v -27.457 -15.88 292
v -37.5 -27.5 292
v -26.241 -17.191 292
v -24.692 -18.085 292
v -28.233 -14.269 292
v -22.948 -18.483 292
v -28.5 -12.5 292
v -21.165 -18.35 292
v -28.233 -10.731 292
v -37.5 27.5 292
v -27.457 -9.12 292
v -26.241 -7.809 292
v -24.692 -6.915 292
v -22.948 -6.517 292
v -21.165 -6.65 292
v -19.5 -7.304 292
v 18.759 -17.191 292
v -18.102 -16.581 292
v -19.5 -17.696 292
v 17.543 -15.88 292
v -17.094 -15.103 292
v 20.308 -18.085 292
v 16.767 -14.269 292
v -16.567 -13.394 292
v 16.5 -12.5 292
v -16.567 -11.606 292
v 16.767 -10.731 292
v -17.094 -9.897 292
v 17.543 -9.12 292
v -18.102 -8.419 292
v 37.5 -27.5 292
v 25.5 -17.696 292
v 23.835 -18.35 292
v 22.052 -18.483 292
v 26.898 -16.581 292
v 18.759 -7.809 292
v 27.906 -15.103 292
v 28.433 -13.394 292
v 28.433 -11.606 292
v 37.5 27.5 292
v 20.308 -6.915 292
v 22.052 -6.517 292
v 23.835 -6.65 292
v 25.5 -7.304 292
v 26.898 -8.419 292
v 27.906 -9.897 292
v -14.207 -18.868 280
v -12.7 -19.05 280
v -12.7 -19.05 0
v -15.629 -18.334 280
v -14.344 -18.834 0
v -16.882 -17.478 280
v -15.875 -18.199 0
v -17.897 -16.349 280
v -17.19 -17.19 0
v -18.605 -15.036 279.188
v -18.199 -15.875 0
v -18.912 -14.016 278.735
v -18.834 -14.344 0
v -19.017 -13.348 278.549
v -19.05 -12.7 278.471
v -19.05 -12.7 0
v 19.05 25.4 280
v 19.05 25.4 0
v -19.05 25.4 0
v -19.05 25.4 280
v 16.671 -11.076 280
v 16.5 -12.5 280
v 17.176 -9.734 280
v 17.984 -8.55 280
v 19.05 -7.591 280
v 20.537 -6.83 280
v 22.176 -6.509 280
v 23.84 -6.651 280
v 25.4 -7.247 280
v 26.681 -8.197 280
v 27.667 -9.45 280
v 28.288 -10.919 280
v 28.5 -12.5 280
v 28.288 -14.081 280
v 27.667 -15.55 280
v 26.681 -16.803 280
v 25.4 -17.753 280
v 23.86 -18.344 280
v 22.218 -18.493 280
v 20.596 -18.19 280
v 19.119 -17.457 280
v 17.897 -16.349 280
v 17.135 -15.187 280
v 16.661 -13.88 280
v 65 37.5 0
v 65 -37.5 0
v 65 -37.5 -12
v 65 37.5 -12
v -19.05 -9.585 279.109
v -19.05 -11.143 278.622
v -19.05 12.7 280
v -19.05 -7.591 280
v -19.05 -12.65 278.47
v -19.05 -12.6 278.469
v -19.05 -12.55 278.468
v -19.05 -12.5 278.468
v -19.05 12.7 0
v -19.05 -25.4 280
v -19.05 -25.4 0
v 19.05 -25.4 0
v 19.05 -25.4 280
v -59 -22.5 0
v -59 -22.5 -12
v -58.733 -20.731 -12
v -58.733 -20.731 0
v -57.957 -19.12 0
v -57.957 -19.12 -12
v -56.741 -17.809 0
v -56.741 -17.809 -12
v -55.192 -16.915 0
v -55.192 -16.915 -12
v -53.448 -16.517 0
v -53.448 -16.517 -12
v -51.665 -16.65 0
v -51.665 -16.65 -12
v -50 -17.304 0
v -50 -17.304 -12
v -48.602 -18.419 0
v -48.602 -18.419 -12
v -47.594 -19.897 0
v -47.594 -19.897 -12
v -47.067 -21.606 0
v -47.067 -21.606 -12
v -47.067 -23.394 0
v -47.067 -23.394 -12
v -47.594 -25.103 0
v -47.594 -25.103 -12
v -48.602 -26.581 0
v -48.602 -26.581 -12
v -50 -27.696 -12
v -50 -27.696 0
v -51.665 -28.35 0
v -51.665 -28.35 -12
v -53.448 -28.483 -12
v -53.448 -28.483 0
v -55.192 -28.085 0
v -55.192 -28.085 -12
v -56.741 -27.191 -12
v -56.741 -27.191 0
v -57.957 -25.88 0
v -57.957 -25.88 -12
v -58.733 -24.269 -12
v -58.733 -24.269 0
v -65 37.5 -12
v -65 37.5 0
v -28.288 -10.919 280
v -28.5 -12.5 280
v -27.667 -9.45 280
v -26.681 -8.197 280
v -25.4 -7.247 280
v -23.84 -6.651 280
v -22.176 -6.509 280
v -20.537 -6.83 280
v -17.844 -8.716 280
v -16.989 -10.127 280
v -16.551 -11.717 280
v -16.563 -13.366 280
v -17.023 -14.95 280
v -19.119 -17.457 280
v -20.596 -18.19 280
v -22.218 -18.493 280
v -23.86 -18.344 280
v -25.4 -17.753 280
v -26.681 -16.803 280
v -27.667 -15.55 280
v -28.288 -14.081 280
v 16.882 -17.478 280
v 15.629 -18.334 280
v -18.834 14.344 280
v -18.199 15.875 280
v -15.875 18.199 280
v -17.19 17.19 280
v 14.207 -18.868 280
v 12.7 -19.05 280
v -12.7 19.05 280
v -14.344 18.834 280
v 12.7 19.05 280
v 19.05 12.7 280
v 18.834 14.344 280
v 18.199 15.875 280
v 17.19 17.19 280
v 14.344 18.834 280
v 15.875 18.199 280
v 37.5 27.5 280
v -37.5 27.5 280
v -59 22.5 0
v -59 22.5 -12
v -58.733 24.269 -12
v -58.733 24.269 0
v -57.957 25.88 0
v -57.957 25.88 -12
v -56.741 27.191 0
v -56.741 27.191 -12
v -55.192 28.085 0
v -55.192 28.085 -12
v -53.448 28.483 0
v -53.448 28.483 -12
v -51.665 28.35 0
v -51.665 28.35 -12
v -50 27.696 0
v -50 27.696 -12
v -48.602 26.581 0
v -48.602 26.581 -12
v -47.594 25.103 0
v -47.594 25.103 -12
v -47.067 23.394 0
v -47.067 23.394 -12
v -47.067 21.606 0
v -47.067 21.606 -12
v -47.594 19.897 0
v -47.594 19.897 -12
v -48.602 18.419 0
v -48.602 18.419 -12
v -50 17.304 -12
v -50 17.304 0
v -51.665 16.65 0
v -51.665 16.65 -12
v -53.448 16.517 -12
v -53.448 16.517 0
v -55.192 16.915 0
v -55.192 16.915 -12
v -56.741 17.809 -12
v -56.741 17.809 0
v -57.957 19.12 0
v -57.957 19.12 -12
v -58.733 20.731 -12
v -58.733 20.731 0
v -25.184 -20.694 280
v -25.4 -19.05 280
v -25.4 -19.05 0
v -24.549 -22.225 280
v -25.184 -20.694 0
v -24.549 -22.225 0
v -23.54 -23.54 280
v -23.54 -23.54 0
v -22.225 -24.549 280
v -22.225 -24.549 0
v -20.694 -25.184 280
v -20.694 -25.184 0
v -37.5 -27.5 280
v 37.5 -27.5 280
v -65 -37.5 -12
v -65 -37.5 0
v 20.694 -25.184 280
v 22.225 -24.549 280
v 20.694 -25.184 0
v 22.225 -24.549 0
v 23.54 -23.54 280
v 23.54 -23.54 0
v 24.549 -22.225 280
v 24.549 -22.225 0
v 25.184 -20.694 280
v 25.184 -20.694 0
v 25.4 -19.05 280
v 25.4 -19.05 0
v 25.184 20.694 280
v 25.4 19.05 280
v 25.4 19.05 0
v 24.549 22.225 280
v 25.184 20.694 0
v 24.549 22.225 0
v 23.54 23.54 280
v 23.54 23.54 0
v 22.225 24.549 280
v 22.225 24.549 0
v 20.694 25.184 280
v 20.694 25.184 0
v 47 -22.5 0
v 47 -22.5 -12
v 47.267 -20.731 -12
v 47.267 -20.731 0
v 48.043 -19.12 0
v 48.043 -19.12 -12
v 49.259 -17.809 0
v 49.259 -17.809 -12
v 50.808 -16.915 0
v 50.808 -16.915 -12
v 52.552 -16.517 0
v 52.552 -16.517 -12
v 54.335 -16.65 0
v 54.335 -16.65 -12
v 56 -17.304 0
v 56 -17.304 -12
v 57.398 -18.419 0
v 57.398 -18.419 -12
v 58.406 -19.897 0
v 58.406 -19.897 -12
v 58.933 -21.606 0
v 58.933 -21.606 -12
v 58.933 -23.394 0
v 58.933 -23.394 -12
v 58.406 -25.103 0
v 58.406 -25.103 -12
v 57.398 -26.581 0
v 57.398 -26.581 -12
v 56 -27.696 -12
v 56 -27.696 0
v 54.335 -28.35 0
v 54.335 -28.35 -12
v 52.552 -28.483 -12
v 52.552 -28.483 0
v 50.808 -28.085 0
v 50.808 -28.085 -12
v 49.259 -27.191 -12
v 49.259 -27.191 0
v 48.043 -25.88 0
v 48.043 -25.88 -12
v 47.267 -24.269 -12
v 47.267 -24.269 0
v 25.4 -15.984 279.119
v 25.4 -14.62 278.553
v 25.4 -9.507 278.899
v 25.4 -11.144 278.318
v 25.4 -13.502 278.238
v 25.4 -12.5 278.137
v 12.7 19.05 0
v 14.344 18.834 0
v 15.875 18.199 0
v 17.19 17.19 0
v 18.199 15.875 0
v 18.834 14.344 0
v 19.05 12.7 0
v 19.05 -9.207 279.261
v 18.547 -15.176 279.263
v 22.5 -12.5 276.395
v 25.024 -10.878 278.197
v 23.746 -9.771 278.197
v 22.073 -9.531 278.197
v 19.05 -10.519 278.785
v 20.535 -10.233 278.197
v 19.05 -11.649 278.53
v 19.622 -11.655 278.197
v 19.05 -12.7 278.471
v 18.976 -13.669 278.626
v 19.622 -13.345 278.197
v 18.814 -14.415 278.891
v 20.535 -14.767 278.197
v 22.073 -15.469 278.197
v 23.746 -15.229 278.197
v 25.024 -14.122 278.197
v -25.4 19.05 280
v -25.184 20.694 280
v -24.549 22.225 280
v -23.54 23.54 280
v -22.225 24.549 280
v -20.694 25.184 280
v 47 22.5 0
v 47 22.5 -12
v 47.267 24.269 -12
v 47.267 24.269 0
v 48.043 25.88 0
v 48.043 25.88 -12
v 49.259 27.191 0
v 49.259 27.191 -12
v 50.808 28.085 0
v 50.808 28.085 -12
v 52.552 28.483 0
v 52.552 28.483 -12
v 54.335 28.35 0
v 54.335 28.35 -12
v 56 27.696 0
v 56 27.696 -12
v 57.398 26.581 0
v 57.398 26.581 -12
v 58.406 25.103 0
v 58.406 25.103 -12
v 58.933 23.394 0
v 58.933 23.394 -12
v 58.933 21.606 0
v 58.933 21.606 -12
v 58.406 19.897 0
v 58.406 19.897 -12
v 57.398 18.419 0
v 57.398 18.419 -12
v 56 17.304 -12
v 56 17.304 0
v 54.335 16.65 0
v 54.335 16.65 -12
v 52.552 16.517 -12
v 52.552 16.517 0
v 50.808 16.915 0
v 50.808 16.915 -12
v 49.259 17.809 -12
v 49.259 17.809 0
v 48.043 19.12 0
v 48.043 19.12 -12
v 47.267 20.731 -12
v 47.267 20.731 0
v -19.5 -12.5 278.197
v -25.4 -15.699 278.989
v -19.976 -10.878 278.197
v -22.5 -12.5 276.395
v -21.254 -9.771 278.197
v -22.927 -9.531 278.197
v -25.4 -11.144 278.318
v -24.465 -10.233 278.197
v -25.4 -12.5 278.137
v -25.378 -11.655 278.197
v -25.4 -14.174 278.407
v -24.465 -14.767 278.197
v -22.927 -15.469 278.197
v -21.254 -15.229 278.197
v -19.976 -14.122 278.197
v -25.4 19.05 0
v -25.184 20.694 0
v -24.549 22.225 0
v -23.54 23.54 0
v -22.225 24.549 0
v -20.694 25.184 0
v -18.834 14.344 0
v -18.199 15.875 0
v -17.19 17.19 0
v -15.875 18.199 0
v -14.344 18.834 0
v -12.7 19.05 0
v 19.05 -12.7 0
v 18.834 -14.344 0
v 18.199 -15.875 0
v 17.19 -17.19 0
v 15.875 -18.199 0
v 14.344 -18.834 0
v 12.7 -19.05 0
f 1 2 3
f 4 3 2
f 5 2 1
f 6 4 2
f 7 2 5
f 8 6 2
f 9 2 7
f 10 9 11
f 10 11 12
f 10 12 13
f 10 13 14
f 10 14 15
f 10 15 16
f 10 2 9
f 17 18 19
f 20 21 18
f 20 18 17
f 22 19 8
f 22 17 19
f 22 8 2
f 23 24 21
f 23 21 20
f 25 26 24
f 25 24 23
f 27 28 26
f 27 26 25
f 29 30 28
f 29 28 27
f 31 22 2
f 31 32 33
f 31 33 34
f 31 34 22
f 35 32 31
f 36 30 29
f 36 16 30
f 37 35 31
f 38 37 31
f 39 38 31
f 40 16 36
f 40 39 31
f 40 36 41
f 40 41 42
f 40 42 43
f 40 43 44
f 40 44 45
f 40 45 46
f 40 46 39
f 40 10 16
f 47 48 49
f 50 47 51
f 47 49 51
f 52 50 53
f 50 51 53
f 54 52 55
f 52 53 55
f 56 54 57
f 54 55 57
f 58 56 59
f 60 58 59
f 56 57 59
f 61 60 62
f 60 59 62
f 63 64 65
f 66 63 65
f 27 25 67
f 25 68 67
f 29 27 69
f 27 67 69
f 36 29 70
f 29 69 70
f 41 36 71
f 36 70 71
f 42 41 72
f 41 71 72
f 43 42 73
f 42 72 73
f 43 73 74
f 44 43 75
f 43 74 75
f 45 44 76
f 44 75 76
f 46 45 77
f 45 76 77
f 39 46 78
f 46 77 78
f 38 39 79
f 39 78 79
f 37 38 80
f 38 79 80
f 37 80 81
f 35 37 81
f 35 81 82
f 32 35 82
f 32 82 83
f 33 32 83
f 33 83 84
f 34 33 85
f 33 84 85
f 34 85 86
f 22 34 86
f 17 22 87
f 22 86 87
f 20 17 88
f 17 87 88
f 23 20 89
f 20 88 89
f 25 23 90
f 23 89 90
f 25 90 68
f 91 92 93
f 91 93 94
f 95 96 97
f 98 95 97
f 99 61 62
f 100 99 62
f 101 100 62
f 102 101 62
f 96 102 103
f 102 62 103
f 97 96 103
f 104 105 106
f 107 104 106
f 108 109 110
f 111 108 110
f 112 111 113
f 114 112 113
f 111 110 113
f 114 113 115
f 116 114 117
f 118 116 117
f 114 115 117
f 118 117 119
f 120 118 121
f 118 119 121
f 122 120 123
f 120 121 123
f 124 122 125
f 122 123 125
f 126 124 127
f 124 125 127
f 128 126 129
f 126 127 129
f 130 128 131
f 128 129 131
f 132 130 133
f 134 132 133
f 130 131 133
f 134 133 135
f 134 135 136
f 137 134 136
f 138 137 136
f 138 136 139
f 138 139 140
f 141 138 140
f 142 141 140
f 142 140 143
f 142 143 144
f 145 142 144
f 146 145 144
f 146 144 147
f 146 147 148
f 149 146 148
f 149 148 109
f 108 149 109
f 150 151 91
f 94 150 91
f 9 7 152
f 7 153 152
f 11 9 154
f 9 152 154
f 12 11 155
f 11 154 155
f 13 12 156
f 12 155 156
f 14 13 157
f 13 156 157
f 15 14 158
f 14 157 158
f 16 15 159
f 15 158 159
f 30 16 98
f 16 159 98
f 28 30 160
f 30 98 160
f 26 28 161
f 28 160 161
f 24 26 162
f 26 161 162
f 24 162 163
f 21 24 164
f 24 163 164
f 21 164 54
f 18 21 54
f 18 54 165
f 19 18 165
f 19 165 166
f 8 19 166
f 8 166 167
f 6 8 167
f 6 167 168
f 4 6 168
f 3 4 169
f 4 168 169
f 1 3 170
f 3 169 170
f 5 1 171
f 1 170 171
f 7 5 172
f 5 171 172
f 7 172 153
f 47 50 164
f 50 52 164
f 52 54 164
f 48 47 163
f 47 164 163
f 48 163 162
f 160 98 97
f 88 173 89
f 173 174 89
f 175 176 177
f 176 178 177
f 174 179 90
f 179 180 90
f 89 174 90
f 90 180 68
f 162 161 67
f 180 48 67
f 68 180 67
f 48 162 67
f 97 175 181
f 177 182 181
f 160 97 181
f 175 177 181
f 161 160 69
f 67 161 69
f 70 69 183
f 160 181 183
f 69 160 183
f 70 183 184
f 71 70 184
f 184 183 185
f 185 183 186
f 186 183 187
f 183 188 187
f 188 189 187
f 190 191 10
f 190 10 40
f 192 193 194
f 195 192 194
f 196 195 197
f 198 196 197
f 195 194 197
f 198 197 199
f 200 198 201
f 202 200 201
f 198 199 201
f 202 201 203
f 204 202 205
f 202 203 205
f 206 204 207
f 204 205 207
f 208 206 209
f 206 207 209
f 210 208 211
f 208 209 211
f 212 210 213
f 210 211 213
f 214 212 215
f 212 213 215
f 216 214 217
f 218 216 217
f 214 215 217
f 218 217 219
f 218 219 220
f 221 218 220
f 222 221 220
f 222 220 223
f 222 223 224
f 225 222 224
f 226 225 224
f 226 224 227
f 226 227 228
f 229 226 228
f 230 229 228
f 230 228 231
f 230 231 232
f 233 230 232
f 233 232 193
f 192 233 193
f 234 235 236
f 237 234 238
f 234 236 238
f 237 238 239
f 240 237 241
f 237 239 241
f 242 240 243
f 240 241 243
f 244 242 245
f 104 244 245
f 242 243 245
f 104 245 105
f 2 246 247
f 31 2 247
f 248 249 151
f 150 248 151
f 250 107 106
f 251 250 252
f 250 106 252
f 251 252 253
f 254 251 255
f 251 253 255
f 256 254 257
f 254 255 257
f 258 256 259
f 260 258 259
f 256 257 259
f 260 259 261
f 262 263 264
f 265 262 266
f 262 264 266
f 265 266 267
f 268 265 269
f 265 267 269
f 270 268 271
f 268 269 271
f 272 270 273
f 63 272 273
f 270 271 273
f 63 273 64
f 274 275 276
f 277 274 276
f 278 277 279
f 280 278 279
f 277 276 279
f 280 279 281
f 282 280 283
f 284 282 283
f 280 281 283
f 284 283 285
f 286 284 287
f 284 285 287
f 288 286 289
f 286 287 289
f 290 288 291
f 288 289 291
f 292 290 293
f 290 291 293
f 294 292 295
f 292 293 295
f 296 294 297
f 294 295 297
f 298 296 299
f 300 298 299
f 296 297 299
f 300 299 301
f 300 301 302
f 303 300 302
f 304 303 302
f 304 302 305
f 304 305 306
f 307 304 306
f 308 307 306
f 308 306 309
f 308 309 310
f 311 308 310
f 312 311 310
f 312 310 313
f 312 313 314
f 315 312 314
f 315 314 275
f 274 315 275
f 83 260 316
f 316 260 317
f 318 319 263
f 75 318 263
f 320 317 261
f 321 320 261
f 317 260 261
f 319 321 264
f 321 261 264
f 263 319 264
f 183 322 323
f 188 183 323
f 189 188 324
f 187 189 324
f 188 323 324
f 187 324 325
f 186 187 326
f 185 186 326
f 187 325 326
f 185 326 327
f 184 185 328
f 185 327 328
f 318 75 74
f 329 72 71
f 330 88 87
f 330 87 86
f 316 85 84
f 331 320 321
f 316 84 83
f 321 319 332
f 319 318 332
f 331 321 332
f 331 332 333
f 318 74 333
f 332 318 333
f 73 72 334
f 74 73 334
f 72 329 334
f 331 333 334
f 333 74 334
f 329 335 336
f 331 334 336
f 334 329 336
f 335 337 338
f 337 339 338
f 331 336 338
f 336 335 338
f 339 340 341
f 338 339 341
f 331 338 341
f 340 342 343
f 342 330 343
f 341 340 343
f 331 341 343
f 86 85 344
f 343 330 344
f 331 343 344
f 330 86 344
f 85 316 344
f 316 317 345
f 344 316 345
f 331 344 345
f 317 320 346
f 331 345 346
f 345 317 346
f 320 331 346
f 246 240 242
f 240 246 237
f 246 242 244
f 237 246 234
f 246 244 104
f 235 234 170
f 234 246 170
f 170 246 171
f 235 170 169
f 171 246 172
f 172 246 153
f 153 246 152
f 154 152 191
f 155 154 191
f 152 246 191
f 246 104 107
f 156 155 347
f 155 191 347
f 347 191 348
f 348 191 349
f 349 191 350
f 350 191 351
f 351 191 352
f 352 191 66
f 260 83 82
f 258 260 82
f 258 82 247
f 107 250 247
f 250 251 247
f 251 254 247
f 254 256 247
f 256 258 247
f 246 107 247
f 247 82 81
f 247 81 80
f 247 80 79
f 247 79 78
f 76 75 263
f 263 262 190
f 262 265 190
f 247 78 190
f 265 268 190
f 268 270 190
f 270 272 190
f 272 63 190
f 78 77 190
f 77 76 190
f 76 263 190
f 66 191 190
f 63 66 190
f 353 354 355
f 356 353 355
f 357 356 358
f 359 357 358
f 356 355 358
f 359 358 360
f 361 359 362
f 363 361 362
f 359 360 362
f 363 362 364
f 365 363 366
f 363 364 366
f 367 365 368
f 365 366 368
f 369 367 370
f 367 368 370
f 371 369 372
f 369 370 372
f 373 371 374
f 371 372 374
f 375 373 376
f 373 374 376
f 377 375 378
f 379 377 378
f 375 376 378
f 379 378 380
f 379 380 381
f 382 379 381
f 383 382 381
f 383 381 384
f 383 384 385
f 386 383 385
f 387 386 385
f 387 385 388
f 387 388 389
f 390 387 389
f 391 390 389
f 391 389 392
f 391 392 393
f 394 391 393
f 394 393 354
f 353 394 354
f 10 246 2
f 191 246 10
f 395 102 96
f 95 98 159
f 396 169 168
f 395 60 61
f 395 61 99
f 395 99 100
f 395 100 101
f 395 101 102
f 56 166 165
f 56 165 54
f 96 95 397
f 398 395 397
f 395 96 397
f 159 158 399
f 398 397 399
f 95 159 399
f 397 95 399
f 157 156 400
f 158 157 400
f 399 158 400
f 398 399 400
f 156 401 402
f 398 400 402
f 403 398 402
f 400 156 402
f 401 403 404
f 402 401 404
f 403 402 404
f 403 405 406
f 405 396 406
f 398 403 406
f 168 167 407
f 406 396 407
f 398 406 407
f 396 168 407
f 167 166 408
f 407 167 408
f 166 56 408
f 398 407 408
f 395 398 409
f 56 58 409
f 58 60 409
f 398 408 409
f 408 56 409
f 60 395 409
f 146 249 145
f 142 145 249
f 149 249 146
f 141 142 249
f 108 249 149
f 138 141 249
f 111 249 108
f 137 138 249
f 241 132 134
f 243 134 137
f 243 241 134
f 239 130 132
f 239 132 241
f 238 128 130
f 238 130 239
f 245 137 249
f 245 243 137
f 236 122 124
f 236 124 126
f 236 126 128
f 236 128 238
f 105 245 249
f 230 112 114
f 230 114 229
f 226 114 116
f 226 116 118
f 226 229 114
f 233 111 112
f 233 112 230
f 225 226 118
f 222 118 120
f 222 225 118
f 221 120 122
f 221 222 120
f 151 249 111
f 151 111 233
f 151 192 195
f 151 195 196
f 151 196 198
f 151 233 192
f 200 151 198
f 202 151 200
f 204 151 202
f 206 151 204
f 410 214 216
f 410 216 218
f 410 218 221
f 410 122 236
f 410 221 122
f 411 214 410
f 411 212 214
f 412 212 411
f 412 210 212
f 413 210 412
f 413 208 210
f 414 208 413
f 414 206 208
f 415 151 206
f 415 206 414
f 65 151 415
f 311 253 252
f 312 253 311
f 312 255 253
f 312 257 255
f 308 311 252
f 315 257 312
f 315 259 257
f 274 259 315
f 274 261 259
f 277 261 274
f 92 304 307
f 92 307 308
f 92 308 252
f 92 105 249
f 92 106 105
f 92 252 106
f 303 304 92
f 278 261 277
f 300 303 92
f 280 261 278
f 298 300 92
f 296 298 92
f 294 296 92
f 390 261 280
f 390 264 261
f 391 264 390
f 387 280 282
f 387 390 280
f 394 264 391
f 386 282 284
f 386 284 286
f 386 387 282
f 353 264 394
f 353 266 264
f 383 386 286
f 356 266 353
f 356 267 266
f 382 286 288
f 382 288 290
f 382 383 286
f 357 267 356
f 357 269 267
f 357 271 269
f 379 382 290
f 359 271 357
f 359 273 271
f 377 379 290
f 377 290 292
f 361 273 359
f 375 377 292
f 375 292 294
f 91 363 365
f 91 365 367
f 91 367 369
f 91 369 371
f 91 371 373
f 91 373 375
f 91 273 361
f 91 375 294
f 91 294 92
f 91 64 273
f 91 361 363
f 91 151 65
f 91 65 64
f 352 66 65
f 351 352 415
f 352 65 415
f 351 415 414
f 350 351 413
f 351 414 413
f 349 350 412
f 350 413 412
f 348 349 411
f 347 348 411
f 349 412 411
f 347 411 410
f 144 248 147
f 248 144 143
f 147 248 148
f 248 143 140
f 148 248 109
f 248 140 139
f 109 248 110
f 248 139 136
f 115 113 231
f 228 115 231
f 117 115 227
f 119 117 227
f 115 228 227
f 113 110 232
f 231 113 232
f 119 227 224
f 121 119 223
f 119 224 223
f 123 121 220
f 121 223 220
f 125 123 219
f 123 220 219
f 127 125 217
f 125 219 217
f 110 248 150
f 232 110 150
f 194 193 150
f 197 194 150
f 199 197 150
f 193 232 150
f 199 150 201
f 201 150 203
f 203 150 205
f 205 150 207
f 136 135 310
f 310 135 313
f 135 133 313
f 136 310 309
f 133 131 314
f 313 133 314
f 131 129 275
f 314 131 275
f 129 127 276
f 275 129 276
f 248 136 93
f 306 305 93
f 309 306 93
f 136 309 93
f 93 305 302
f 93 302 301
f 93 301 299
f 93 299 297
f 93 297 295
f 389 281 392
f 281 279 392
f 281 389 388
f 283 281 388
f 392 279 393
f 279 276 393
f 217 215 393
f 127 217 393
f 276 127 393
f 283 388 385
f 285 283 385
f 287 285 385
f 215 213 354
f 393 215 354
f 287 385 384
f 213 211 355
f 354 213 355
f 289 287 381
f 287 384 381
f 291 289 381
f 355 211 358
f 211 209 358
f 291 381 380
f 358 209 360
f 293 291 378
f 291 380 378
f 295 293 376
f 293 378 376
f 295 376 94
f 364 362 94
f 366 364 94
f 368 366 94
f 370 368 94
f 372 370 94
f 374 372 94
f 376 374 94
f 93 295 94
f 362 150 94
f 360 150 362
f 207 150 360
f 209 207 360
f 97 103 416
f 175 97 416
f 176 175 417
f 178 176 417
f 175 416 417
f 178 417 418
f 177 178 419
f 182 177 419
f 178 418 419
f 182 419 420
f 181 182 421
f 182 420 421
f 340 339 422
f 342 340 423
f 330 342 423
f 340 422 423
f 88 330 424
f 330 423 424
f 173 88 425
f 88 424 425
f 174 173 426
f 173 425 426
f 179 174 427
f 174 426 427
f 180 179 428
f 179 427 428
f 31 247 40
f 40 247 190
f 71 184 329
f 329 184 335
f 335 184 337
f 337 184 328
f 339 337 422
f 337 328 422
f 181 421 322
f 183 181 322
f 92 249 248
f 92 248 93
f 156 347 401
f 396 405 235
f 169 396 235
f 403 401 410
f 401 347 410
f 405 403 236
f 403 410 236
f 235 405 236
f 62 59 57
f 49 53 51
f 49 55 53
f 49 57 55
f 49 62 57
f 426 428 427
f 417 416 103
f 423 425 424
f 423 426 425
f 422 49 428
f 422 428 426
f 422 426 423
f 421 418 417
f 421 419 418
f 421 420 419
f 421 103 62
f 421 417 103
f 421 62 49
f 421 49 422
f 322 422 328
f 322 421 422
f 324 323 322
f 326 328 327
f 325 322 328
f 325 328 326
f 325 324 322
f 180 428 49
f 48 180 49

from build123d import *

# Parameters (mm, degrees)
F0_W     = 130
F0_H     = 75
F1_DEPTH = 12
F3_DEPTH = 280
F5_W     = 75
F5_H     = 55
F6_DEPTH = 12
F7_D     = 12
F9_D     = 12
F9_DEPTH = 12
F9_TIP   = 3.6051637142


with BuildPart() as f1:
    # F0 (on Top) → F1 (new body)
    with BuildSketch(Plane.XY):
        Rectangle(F0_W, F0_H)
    extrude(amount=-F1_DEPTH)

    # F2 (on face) → F3 (join)
    with BuildSketch(Plane.XY):
        with BuildLine():
            Line((-19.05, -25.4), (19.05, -25.4))
            ThreePointArc((19.05, -25.4), (23.5401280605, -23.5401280605), (25.4, -19.05))
            Line((25.4, -19.05), (25.4, 19.05))
            ThreePointArc((25.4, 19.05), (23.5401280605, 23.5401280605), (19.05, 25.4))
            Line((19.05, 25.4), (-19.05, 25.4))
            ThreePointArc((-19.05, 25.4), (-23.5401280605, 23.5401280605), (-25.4, 19.05))
            Line((-25.4, 19.05), (-25.4, -19.05))
            ThreePointArc((-25.4, -19.05), (-23.5401280605, -23.5401280605), (-19.05, -25.4))
        make_face()
        with BuildLine():
            Line((-12.7, 19.05), (12.7, 19.05))
            ThreePointArc((12.7, 19.05), (17.1901280605, 17.1901280605), (19.05, 12.7))
            Line((19.05, 12.7), (19.05, -12.7))
            ThreePointArc((19.05, -12.7), (17.1901280605, -17.1901280605), (12.7, -19.05))
            Line((12.7, -19.05), (-12.7, -19.05))
            ThreePointArc((-12.7, -19.05), (-17.1901280605, -17.1901280605), (-19.05, -12.7))
            Line((-19.05, -12.7), (-19.05, 12.7))
            ThreePointArc((-19.05, 12.7), (-17.1901280605, 17.1901280605), (-12.7, 19.05))
        make_face(mode=Mode.SUBTRACT)
    extrude(amount=F3_DEPTH)

    # F5 (on face) → F6 (join)
    with BuildSketch(Plane.XY.offset(280)):
        Rectangle(F5_W, F5_H)
        with BuildLine():
            Line((19.05, -25.4), (-19.05, -25.4))
            ThreePointArc((-19.05, -25.4), (-23.5401280605, -23.5401280605), (-25.4, -19.05))
            Line((-25.4, -19.05), (-25.4, 19.05))
            ThreePointArc((-25.4, 19.05), (-23.5401280605, 23.5401280605), (-19.05, 25.4))
            Line((-19.05, 25.4), (19.05, 25.4))
            ThreePointArc((19.05, 25.4), (23.5401280605, 23.5401280605), (25.4, 19.05))
            Line((25.4, 19.05), (25.4, -19.05))
            ThreePointArc((25.4, -19.05), (23.5401280605, -23.5401280605), (19.05, -25.4))
        make_face(mode=Mode.SUBTRACT)
        with BuildLine():
            ThreePointArc((-25.4, -19.05), (-23.5401280605, -23.5401280605), (-19.05, -25.4))
            Line((-19.05, -25.4), (19.05, -25.4))
            ThreePointArc((19.05, -25.4), (23.5401280605, -23.5401280605), (25.4, -19.05))
            Line((25.4, -19.05), (25.4, 19.05))
            ThreePointArc((25.4, 19.05), (23.5401280605, 23.5401280605), (19.05, 25.4))
            Line((19.05, 25.4), (-19.05, 25.4))
            ThreePointArc((-19.05, 25.4), (-23.5401280605, 23.5401280605), (-25.4, 19.05))
            Line((-25.4, 19.05), (-25.4, -19.05))
        make_face()
        with BuildLine():
            Line((-19.05, -12.7), (-19.05, 12.7))
            ThreePointArc((-19.05, 12.7), (-17.1901280605, 17.1901280605), (-12.7, 19.05))
            Line((-12.7, 19.05), (12.7, 19.05))
            ThreePointArc((12.7, 19.05), (17.1901280605, 17.1901280605), (19.05, 12.7))
            Line((19.05, 12.7), (19.05, -12.7))
            ThreePointArc((19.05, -12.7), (17.1901280605, -17.1901280605), (12.7, -19.05))
            Line((12.7, -19.05), (-12.7, -19.05))
            ThreePointArc((-12.7, -19.05), (-17.1901280605, -17.1901280605), (-19.05, -12.7))
        make_face(mode=Mode.SUBTRACT)
        with BuildLine():
            ThreePointArc((-12.7, 19.05), (-17.1901280605, 17.1901280605), (-19.05, 12.7))
            Line((-19.05, 12.7), (-19.05, -12.7))
            ThreePointArc((-19.05, -12.7), (-17.1901280605, -17.1901280605), (-12.7, -19.05))
            Line((-12.7, -19.05), (12.7, -19.05))
            ThreePointArc((12.7, -19.05), (17.1901280605, -17.1901280605), (19.05, -12.7))
            Line((19.05, -12.7), (19.05, 12.7))
            ThreePointArc((19.05, 12.7), (17.1901280605, 17.1901280605), (12.7, 19.05))
            Line((12.7, 19.05), (-12.7, 19.05))
        make_face()
    extrude(amount=F6_DEPTH)

    # F7 (through all)
    with Locations(Plane.XY):
        with Locations((-53, 22.5), (53, 22.5), (53, -22.5), (-53, -22.5)):
            Hole(F7_D / 2)

    # F9
    with Locations(Plane.XY.offset(292)):
        with Locations((-22.5, -12.5), (22.5, -12.5)):
            Hole(F9_D / 2, depth=F9_DEPTH)
            with Locations((0, 0, -(F9_DEPTH + F9_TIP / 2))):  # 118° drill point
                Cone(0, F9_D / 2, F9_TIP, mode=Mode.SUBTRACT)


solid = f1.part
